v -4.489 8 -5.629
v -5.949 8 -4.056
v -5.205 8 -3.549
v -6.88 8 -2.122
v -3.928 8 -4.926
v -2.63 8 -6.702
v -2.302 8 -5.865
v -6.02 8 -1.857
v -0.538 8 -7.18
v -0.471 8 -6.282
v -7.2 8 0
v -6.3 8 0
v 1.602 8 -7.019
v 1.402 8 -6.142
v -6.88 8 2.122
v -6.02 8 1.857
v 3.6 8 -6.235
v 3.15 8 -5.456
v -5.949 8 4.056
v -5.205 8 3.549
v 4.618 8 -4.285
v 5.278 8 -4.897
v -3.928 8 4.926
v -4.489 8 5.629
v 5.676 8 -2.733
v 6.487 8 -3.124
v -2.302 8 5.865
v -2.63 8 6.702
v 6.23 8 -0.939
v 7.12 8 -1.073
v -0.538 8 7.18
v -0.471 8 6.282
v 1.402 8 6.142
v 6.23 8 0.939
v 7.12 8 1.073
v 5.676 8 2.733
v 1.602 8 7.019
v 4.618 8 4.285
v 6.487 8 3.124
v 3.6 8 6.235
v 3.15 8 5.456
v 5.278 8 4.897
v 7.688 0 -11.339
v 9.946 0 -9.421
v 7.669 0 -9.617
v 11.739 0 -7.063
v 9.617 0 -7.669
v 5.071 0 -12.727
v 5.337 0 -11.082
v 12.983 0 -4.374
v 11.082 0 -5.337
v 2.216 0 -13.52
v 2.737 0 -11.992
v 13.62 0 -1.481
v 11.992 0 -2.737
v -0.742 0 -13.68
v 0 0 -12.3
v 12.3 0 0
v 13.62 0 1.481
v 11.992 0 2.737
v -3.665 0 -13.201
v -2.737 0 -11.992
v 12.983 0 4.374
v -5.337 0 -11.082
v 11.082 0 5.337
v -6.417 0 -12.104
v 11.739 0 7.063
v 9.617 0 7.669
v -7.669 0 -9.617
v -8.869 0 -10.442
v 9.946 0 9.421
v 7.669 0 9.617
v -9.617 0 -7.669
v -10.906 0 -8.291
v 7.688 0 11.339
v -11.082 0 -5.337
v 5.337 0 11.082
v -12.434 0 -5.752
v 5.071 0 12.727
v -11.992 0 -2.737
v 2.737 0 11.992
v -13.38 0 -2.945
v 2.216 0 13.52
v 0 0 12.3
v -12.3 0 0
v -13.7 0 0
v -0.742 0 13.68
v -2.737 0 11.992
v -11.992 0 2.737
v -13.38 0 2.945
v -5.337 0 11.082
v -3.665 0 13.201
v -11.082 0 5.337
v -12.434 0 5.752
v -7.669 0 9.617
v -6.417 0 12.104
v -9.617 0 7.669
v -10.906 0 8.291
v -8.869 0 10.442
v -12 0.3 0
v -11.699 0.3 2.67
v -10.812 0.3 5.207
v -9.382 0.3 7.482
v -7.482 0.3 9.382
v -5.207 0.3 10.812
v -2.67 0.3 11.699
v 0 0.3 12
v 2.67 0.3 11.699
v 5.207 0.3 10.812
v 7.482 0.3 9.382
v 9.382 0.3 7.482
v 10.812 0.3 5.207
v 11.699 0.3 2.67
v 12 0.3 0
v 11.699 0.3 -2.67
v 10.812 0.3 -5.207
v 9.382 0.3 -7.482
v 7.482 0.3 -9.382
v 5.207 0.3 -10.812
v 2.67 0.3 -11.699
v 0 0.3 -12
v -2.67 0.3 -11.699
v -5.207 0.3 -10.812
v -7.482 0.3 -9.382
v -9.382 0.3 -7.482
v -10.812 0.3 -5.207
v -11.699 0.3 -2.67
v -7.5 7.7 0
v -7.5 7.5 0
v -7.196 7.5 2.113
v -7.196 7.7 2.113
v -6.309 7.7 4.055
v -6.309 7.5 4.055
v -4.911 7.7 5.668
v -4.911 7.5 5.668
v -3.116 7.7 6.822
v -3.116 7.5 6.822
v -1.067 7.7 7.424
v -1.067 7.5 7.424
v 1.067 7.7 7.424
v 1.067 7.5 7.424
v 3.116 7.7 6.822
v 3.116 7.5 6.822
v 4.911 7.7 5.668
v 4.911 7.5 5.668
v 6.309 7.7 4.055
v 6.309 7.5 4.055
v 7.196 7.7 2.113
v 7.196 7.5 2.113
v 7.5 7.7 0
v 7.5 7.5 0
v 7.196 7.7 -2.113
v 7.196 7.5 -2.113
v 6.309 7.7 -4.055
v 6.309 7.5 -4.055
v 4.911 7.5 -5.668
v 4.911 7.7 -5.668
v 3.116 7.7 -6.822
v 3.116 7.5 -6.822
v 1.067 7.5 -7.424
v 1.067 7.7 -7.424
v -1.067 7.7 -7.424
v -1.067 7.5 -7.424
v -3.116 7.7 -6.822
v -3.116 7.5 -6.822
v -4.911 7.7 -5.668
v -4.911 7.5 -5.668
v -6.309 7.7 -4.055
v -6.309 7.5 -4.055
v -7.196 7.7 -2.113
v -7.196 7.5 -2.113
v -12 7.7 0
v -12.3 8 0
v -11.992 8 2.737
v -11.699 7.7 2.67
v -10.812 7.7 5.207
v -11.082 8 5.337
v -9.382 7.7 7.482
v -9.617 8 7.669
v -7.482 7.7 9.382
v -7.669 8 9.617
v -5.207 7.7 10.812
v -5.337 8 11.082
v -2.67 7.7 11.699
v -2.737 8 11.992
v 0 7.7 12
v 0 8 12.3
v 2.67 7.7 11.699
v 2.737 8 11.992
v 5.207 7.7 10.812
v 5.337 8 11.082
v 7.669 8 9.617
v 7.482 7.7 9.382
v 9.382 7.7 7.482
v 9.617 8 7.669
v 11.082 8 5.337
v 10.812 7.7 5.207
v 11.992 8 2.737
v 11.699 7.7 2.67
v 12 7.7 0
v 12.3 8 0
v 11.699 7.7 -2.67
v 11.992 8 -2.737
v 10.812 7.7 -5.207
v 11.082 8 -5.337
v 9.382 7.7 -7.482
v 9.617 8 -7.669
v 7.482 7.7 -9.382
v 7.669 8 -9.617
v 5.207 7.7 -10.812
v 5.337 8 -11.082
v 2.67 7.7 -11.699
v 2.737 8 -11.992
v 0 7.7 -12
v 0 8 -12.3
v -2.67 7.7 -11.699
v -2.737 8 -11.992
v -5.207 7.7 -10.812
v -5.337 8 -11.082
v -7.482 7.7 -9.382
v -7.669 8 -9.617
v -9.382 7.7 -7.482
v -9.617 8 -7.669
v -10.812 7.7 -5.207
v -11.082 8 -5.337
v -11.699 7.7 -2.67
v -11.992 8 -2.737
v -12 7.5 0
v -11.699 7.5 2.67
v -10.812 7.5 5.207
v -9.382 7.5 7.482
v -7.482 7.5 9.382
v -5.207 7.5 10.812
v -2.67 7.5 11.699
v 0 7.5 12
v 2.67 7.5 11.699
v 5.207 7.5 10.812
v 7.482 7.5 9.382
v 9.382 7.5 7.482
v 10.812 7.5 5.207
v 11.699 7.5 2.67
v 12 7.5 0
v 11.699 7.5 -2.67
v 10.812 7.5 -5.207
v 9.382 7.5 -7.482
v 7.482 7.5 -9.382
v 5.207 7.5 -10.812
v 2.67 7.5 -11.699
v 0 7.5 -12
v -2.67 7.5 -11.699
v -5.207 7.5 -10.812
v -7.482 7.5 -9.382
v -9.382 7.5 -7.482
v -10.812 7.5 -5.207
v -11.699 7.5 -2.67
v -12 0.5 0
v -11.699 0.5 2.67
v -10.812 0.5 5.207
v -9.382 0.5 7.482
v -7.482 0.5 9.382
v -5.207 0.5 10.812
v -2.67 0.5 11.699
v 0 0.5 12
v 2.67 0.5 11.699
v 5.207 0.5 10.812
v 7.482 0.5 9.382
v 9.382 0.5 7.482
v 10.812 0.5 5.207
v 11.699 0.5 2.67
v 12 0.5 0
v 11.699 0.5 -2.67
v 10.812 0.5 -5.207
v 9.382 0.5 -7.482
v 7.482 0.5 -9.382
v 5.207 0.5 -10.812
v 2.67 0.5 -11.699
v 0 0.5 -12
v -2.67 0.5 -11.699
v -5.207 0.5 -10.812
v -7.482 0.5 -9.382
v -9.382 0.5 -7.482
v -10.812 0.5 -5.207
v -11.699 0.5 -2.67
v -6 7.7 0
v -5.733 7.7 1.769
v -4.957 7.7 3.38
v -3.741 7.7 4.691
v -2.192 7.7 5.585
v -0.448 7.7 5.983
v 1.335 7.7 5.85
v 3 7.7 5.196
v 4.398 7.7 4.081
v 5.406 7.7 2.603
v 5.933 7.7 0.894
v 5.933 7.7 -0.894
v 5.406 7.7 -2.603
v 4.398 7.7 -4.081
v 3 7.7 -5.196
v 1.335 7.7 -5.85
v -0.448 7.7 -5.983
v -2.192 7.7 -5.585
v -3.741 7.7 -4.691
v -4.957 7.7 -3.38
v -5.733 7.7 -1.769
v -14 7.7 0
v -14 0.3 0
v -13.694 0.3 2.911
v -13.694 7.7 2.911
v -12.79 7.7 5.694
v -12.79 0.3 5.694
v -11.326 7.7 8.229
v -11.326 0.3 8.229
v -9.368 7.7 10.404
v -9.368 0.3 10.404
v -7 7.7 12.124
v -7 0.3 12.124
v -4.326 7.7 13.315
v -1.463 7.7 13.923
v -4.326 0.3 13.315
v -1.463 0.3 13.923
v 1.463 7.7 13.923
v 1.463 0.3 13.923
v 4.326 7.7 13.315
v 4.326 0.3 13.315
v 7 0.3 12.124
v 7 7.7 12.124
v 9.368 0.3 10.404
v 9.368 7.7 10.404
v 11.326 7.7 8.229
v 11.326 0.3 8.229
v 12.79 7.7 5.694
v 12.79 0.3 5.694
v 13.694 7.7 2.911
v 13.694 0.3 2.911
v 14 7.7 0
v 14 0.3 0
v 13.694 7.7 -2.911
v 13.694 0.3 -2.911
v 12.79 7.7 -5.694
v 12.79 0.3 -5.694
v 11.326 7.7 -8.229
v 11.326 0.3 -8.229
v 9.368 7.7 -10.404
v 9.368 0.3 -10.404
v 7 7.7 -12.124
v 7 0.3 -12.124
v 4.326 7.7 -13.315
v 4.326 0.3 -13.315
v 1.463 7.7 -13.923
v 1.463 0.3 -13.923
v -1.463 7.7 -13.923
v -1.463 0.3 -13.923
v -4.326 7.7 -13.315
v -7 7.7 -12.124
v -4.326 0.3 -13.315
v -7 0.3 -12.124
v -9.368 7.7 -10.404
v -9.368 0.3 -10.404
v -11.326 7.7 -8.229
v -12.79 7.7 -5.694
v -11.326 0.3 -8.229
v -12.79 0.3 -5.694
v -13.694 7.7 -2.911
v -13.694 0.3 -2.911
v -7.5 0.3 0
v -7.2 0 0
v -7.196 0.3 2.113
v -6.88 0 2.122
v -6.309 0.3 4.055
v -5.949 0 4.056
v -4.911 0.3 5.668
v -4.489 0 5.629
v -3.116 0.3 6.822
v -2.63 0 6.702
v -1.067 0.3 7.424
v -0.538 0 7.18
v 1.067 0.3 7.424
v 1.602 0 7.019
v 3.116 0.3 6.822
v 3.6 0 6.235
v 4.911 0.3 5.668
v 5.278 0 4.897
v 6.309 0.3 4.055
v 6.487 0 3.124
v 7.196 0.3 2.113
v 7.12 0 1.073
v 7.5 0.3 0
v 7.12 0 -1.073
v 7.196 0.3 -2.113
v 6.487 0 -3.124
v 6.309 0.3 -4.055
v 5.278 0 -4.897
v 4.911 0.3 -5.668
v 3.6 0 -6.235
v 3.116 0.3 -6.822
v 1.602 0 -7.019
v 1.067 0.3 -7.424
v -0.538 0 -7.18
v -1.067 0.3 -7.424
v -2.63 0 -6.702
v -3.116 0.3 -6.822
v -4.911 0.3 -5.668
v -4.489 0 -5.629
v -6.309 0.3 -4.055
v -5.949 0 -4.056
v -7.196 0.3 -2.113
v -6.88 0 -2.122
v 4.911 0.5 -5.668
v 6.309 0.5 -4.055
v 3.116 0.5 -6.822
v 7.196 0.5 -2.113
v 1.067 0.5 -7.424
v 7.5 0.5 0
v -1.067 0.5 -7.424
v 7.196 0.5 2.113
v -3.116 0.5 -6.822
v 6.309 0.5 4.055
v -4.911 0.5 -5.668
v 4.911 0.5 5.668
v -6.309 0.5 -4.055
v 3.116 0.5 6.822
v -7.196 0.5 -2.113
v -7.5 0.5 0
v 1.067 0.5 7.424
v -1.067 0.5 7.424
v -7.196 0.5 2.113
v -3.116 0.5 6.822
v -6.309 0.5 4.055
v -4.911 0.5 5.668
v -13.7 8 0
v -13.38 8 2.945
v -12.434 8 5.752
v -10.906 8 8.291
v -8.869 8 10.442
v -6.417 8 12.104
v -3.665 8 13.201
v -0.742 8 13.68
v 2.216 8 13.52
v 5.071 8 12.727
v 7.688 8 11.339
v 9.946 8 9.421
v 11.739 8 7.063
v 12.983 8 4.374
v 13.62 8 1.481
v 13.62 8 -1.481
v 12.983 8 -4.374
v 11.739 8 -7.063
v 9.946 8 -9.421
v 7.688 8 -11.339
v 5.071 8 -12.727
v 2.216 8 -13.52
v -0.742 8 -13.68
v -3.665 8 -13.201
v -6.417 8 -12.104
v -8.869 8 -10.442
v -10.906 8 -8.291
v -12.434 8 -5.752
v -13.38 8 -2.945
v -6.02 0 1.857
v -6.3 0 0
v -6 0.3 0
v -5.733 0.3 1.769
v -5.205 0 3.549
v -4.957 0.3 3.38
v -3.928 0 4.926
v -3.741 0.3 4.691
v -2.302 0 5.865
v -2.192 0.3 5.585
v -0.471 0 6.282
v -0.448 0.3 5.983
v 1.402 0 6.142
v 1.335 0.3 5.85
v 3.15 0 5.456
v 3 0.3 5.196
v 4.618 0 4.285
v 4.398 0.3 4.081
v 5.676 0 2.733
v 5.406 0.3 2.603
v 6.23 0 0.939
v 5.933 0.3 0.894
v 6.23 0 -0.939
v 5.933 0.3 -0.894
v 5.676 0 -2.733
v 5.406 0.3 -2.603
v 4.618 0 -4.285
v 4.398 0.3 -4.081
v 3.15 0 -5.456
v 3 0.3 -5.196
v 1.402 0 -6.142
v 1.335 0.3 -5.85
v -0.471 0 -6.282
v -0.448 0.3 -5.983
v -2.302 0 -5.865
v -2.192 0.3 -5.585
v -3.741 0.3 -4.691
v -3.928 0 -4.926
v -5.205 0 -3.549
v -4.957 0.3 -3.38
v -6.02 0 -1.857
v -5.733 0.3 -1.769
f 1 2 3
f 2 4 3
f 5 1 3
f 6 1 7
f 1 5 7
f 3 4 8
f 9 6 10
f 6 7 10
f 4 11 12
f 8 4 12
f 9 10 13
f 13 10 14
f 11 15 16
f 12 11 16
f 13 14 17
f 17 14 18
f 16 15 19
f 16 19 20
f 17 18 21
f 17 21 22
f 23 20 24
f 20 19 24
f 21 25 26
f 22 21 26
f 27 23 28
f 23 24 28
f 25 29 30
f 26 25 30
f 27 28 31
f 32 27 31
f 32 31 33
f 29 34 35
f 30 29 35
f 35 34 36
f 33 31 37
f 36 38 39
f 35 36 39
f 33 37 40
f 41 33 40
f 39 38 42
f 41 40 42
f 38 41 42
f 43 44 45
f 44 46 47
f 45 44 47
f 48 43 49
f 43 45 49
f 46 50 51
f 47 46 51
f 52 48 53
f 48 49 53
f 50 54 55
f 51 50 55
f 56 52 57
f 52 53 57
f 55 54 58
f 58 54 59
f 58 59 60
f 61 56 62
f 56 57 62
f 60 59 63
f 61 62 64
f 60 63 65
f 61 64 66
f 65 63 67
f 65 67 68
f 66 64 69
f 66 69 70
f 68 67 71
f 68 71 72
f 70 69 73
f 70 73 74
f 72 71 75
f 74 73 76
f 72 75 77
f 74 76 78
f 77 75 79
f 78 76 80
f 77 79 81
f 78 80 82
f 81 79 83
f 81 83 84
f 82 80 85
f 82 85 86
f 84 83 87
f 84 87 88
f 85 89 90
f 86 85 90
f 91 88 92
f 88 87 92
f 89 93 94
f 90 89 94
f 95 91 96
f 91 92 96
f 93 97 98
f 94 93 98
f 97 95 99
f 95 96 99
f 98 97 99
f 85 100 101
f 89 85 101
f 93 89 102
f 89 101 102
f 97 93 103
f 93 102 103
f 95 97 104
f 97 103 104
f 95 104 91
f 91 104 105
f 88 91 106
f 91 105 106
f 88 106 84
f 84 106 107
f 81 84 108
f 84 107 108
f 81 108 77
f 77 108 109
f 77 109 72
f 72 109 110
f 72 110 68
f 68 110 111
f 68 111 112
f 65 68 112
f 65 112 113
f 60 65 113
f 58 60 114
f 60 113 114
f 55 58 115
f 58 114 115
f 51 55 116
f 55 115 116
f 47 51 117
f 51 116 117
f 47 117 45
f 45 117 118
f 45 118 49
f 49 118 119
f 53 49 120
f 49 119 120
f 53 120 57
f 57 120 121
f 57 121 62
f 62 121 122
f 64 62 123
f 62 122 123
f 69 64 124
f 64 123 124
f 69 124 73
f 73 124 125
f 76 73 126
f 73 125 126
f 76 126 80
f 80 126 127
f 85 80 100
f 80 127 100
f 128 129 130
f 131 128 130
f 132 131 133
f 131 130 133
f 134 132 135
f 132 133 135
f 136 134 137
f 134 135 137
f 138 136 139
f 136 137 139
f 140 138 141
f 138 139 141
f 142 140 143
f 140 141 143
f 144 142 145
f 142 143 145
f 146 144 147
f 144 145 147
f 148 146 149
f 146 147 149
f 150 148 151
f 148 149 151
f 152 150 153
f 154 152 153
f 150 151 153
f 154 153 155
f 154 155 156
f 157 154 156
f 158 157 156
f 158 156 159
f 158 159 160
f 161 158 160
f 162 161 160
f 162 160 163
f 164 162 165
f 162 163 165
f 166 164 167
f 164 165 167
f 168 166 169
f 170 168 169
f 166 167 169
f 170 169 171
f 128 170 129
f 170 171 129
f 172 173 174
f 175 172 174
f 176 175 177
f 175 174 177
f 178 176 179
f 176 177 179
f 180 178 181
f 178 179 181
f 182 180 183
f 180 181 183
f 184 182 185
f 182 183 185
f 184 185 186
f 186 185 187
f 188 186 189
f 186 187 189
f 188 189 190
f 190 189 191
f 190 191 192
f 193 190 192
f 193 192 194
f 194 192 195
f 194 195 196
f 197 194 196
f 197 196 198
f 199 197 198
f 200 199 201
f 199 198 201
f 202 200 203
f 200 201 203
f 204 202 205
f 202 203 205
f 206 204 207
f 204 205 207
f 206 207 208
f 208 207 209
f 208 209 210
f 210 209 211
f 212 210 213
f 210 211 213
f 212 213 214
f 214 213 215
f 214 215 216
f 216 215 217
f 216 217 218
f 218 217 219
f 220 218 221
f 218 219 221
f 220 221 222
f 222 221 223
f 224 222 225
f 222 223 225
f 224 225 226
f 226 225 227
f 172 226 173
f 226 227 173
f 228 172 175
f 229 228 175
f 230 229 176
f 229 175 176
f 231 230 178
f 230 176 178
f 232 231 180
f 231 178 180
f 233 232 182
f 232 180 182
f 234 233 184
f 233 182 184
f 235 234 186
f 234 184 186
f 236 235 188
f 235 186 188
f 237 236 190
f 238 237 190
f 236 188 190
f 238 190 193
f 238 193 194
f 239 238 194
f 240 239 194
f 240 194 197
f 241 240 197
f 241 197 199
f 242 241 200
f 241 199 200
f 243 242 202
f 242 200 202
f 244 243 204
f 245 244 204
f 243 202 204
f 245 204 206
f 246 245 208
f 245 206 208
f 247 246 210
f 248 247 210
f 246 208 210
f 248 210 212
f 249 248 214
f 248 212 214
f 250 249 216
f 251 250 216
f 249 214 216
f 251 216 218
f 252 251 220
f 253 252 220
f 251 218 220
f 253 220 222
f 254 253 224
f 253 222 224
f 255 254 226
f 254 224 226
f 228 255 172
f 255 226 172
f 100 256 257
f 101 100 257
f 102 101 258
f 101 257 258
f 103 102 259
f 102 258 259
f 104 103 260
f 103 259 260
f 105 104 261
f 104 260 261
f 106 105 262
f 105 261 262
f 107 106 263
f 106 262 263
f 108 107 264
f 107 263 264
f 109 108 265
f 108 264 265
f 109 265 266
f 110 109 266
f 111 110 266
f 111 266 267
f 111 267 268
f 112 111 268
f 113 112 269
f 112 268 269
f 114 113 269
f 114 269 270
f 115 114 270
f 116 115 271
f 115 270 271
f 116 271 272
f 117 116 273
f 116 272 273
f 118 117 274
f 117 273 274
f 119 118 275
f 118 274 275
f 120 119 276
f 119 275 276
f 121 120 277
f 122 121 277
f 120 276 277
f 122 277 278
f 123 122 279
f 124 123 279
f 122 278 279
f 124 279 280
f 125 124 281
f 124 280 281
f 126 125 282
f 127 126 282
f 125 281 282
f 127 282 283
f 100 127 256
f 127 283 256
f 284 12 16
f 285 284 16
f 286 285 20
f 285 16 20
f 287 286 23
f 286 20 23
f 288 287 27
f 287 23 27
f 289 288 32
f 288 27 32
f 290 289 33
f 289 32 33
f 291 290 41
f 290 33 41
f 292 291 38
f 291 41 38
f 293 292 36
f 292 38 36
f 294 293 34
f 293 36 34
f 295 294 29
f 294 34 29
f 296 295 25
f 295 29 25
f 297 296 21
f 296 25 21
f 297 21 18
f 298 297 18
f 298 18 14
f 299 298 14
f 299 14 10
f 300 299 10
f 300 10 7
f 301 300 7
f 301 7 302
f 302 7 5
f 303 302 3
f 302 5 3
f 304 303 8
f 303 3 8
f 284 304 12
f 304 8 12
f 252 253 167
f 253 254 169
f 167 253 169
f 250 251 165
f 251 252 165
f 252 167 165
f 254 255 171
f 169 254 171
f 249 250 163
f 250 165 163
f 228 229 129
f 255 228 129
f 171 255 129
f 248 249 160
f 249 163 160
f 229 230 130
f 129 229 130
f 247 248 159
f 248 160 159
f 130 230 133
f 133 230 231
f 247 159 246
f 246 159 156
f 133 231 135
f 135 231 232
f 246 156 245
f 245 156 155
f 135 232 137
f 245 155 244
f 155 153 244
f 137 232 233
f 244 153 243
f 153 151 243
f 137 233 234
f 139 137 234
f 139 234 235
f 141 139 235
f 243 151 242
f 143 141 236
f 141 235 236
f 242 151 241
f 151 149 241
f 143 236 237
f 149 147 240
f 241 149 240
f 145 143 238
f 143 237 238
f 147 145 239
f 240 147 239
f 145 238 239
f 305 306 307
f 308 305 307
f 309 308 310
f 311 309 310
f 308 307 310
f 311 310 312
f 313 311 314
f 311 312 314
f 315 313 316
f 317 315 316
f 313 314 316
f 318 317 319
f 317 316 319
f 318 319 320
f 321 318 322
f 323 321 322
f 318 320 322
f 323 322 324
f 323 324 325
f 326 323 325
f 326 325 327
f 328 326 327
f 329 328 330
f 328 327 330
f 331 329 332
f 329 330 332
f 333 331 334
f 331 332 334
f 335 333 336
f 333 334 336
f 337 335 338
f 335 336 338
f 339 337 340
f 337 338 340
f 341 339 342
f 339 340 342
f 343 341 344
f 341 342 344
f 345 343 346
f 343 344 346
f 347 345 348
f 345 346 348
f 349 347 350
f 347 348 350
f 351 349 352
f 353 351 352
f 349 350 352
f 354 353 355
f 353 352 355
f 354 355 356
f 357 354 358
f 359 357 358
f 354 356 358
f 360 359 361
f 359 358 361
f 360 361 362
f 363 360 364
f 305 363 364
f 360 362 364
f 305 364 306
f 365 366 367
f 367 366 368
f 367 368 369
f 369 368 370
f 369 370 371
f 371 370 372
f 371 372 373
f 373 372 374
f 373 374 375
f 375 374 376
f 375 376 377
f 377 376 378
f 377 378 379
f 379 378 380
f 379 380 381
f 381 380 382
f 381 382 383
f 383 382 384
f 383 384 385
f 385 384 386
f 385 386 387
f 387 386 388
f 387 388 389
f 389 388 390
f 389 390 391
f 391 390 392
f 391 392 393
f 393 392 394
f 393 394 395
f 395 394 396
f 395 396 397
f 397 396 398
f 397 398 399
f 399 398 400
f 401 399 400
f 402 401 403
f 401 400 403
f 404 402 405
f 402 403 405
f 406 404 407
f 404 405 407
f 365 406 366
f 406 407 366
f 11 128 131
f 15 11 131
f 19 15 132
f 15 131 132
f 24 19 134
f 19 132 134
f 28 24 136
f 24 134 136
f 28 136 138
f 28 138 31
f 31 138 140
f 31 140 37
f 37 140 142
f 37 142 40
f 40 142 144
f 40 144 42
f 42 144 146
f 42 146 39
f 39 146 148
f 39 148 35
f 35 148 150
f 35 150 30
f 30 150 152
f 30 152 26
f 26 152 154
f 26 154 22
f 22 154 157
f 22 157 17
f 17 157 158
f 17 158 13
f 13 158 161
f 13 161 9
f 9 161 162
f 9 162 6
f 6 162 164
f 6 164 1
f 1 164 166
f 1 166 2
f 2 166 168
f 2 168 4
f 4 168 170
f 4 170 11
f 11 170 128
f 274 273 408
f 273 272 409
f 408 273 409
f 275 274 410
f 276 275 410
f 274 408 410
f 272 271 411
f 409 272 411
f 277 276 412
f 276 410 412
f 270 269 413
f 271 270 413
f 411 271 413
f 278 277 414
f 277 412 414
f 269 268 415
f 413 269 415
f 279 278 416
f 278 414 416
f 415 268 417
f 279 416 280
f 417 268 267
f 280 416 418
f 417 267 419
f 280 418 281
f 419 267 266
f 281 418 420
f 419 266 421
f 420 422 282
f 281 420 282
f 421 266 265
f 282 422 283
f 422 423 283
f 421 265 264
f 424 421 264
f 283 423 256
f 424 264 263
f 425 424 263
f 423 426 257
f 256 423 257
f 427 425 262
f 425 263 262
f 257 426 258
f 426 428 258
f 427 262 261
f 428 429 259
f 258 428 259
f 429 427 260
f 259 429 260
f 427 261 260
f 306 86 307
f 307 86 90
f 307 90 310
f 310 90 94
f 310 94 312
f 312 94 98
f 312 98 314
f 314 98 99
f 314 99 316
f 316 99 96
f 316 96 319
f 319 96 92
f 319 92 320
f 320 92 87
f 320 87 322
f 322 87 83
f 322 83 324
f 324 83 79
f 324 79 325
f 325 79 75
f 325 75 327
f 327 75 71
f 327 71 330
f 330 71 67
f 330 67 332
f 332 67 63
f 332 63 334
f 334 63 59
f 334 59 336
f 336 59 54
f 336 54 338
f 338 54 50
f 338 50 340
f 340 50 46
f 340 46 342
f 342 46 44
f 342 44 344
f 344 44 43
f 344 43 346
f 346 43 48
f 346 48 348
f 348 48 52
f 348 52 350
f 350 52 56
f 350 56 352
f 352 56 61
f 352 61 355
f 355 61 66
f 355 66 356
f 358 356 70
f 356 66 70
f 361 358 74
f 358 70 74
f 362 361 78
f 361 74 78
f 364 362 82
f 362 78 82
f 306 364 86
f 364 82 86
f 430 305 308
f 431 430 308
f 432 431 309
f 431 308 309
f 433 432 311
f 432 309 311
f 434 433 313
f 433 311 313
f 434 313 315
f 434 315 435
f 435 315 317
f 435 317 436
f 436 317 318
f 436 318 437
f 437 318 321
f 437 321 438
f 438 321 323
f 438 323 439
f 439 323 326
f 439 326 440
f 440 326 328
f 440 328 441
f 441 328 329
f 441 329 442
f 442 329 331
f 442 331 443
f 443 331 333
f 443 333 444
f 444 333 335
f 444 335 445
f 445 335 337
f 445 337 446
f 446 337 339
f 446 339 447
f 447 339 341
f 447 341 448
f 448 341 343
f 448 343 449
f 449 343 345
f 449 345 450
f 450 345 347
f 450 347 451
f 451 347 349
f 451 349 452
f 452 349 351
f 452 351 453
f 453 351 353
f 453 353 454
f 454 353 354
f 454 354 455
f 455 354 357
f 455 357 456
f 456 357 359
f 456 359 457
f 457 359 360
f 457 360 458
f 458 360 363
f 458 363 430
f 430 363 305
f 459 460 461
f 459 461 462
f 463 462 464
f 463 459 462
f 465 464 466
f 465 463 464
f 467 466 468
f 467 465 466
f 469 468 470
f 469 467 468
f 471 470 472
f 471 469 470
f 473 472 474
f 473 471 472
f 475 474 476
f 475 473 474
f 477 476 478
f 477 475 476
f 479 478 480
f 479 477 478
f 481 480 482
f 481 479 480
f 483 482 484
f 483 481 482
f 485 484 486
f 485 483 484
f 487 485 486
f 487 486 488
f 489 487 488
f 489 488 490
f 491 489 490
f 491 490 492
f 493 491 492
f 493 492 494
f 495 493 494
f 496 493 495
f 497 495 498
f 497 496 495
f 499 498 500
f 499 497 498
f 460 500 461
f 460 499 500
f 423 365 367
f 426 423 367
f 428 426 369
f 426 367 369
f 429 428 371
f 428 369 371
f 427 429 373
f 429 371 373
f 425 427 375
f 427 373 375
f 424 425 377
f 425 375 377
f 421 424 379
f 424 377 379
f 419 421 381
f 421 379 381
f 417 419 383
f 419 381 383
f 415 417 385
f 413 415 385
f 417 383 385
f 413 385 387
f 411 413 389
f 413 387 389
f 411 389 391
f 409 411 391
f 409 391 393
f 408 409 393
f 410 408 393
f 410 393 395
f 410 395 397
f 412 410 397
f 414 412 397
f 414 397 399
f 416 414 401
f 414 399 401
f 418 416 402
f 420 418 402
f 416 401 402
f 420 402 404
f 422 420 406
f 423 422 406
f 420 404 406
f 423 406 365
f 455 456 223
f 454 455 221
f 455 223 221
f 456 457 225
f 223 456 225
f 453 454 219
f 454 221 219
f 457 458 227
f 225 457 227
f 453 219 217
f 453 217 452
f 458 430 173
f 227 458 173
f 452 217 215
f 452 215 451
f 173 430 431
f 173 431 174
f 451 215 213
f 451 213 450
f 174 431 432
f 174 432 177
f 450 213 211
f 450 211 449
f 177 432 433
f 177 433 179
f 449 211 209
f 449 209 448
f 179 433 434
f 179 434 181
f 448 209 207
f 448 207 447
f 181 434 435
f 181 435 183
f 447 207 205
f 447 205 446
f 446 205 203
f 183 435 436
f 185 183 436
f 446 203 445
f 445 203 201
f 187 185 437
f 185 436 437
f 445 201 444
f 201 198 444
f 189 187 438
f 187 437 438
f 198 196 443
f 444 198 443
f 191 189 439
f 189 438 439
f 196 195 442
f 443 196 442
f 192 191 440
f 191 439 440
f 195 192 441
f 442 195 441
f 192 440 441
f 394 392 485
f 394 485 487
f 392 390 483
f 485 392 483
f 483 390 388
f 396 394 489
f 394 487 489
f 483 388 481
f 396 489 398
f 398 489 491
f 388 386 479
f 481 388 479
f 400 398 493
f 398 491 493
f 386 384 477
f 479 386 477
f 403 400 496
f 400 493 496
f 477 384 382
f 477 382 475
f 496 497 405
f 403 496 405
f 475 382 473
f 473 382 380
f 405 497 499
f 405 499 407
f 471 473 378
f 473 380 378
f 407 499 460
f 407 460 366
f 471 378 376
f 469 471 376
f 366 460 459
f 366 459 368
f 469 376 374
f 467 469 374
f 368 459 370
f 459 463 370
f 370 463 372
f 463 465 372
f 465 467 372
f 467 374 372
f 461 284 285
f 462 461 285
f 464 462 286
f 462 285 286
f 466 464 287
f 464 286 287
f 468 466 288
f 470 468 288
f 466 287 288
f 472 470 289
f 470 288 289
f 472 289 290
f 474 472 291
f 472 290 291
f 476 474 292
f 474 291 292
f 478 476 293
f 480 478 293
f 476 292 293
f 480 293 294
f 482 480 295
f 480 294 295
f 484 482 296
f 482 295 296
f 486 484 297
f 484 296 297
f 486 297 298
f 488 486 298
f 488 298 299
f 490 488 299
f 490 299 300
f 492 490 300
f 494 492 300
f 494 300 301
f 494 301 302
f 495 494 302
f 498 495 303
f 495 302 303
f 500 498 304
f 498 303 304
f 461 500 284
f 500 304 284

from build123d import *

# Parameters (mm, degrees)
CHAMFER1_SIZE = 0.3


with BuildPart() as part:
    # Sketch1 → Revolve1 (revolve)
    with BuildSketch(Plane.XY):
        Polygon((-6, 0), (-6, 8), (-7.5, 8), (-7.5, 7.5), (-12, 7.5), (-12, 8), (-14, 8), (-14, 0), (-12, 0), (-12, 0.5), (-7.5, 0.5), (-7.5, 0), align=None)
    revolve(axis=Axis((0, 0, 0), (0, 1, 0)))

    # Chamfer1
    chamfer1_edges = [part.edges().sort_by_distance(p)[0] for p in [
        (14, 0, 0),
        (14, 8, 0),
        (12, 8, 0),
        (7.5, 8, 0),
        (6, 8, 0),
        (6, 0, 0),
        (7.5, 0, 0),
        (12, 0, 0),
    ]]
    chamfer(chamfer1_edges, length=CHAMFER1_SIZE)


solid = part.part
